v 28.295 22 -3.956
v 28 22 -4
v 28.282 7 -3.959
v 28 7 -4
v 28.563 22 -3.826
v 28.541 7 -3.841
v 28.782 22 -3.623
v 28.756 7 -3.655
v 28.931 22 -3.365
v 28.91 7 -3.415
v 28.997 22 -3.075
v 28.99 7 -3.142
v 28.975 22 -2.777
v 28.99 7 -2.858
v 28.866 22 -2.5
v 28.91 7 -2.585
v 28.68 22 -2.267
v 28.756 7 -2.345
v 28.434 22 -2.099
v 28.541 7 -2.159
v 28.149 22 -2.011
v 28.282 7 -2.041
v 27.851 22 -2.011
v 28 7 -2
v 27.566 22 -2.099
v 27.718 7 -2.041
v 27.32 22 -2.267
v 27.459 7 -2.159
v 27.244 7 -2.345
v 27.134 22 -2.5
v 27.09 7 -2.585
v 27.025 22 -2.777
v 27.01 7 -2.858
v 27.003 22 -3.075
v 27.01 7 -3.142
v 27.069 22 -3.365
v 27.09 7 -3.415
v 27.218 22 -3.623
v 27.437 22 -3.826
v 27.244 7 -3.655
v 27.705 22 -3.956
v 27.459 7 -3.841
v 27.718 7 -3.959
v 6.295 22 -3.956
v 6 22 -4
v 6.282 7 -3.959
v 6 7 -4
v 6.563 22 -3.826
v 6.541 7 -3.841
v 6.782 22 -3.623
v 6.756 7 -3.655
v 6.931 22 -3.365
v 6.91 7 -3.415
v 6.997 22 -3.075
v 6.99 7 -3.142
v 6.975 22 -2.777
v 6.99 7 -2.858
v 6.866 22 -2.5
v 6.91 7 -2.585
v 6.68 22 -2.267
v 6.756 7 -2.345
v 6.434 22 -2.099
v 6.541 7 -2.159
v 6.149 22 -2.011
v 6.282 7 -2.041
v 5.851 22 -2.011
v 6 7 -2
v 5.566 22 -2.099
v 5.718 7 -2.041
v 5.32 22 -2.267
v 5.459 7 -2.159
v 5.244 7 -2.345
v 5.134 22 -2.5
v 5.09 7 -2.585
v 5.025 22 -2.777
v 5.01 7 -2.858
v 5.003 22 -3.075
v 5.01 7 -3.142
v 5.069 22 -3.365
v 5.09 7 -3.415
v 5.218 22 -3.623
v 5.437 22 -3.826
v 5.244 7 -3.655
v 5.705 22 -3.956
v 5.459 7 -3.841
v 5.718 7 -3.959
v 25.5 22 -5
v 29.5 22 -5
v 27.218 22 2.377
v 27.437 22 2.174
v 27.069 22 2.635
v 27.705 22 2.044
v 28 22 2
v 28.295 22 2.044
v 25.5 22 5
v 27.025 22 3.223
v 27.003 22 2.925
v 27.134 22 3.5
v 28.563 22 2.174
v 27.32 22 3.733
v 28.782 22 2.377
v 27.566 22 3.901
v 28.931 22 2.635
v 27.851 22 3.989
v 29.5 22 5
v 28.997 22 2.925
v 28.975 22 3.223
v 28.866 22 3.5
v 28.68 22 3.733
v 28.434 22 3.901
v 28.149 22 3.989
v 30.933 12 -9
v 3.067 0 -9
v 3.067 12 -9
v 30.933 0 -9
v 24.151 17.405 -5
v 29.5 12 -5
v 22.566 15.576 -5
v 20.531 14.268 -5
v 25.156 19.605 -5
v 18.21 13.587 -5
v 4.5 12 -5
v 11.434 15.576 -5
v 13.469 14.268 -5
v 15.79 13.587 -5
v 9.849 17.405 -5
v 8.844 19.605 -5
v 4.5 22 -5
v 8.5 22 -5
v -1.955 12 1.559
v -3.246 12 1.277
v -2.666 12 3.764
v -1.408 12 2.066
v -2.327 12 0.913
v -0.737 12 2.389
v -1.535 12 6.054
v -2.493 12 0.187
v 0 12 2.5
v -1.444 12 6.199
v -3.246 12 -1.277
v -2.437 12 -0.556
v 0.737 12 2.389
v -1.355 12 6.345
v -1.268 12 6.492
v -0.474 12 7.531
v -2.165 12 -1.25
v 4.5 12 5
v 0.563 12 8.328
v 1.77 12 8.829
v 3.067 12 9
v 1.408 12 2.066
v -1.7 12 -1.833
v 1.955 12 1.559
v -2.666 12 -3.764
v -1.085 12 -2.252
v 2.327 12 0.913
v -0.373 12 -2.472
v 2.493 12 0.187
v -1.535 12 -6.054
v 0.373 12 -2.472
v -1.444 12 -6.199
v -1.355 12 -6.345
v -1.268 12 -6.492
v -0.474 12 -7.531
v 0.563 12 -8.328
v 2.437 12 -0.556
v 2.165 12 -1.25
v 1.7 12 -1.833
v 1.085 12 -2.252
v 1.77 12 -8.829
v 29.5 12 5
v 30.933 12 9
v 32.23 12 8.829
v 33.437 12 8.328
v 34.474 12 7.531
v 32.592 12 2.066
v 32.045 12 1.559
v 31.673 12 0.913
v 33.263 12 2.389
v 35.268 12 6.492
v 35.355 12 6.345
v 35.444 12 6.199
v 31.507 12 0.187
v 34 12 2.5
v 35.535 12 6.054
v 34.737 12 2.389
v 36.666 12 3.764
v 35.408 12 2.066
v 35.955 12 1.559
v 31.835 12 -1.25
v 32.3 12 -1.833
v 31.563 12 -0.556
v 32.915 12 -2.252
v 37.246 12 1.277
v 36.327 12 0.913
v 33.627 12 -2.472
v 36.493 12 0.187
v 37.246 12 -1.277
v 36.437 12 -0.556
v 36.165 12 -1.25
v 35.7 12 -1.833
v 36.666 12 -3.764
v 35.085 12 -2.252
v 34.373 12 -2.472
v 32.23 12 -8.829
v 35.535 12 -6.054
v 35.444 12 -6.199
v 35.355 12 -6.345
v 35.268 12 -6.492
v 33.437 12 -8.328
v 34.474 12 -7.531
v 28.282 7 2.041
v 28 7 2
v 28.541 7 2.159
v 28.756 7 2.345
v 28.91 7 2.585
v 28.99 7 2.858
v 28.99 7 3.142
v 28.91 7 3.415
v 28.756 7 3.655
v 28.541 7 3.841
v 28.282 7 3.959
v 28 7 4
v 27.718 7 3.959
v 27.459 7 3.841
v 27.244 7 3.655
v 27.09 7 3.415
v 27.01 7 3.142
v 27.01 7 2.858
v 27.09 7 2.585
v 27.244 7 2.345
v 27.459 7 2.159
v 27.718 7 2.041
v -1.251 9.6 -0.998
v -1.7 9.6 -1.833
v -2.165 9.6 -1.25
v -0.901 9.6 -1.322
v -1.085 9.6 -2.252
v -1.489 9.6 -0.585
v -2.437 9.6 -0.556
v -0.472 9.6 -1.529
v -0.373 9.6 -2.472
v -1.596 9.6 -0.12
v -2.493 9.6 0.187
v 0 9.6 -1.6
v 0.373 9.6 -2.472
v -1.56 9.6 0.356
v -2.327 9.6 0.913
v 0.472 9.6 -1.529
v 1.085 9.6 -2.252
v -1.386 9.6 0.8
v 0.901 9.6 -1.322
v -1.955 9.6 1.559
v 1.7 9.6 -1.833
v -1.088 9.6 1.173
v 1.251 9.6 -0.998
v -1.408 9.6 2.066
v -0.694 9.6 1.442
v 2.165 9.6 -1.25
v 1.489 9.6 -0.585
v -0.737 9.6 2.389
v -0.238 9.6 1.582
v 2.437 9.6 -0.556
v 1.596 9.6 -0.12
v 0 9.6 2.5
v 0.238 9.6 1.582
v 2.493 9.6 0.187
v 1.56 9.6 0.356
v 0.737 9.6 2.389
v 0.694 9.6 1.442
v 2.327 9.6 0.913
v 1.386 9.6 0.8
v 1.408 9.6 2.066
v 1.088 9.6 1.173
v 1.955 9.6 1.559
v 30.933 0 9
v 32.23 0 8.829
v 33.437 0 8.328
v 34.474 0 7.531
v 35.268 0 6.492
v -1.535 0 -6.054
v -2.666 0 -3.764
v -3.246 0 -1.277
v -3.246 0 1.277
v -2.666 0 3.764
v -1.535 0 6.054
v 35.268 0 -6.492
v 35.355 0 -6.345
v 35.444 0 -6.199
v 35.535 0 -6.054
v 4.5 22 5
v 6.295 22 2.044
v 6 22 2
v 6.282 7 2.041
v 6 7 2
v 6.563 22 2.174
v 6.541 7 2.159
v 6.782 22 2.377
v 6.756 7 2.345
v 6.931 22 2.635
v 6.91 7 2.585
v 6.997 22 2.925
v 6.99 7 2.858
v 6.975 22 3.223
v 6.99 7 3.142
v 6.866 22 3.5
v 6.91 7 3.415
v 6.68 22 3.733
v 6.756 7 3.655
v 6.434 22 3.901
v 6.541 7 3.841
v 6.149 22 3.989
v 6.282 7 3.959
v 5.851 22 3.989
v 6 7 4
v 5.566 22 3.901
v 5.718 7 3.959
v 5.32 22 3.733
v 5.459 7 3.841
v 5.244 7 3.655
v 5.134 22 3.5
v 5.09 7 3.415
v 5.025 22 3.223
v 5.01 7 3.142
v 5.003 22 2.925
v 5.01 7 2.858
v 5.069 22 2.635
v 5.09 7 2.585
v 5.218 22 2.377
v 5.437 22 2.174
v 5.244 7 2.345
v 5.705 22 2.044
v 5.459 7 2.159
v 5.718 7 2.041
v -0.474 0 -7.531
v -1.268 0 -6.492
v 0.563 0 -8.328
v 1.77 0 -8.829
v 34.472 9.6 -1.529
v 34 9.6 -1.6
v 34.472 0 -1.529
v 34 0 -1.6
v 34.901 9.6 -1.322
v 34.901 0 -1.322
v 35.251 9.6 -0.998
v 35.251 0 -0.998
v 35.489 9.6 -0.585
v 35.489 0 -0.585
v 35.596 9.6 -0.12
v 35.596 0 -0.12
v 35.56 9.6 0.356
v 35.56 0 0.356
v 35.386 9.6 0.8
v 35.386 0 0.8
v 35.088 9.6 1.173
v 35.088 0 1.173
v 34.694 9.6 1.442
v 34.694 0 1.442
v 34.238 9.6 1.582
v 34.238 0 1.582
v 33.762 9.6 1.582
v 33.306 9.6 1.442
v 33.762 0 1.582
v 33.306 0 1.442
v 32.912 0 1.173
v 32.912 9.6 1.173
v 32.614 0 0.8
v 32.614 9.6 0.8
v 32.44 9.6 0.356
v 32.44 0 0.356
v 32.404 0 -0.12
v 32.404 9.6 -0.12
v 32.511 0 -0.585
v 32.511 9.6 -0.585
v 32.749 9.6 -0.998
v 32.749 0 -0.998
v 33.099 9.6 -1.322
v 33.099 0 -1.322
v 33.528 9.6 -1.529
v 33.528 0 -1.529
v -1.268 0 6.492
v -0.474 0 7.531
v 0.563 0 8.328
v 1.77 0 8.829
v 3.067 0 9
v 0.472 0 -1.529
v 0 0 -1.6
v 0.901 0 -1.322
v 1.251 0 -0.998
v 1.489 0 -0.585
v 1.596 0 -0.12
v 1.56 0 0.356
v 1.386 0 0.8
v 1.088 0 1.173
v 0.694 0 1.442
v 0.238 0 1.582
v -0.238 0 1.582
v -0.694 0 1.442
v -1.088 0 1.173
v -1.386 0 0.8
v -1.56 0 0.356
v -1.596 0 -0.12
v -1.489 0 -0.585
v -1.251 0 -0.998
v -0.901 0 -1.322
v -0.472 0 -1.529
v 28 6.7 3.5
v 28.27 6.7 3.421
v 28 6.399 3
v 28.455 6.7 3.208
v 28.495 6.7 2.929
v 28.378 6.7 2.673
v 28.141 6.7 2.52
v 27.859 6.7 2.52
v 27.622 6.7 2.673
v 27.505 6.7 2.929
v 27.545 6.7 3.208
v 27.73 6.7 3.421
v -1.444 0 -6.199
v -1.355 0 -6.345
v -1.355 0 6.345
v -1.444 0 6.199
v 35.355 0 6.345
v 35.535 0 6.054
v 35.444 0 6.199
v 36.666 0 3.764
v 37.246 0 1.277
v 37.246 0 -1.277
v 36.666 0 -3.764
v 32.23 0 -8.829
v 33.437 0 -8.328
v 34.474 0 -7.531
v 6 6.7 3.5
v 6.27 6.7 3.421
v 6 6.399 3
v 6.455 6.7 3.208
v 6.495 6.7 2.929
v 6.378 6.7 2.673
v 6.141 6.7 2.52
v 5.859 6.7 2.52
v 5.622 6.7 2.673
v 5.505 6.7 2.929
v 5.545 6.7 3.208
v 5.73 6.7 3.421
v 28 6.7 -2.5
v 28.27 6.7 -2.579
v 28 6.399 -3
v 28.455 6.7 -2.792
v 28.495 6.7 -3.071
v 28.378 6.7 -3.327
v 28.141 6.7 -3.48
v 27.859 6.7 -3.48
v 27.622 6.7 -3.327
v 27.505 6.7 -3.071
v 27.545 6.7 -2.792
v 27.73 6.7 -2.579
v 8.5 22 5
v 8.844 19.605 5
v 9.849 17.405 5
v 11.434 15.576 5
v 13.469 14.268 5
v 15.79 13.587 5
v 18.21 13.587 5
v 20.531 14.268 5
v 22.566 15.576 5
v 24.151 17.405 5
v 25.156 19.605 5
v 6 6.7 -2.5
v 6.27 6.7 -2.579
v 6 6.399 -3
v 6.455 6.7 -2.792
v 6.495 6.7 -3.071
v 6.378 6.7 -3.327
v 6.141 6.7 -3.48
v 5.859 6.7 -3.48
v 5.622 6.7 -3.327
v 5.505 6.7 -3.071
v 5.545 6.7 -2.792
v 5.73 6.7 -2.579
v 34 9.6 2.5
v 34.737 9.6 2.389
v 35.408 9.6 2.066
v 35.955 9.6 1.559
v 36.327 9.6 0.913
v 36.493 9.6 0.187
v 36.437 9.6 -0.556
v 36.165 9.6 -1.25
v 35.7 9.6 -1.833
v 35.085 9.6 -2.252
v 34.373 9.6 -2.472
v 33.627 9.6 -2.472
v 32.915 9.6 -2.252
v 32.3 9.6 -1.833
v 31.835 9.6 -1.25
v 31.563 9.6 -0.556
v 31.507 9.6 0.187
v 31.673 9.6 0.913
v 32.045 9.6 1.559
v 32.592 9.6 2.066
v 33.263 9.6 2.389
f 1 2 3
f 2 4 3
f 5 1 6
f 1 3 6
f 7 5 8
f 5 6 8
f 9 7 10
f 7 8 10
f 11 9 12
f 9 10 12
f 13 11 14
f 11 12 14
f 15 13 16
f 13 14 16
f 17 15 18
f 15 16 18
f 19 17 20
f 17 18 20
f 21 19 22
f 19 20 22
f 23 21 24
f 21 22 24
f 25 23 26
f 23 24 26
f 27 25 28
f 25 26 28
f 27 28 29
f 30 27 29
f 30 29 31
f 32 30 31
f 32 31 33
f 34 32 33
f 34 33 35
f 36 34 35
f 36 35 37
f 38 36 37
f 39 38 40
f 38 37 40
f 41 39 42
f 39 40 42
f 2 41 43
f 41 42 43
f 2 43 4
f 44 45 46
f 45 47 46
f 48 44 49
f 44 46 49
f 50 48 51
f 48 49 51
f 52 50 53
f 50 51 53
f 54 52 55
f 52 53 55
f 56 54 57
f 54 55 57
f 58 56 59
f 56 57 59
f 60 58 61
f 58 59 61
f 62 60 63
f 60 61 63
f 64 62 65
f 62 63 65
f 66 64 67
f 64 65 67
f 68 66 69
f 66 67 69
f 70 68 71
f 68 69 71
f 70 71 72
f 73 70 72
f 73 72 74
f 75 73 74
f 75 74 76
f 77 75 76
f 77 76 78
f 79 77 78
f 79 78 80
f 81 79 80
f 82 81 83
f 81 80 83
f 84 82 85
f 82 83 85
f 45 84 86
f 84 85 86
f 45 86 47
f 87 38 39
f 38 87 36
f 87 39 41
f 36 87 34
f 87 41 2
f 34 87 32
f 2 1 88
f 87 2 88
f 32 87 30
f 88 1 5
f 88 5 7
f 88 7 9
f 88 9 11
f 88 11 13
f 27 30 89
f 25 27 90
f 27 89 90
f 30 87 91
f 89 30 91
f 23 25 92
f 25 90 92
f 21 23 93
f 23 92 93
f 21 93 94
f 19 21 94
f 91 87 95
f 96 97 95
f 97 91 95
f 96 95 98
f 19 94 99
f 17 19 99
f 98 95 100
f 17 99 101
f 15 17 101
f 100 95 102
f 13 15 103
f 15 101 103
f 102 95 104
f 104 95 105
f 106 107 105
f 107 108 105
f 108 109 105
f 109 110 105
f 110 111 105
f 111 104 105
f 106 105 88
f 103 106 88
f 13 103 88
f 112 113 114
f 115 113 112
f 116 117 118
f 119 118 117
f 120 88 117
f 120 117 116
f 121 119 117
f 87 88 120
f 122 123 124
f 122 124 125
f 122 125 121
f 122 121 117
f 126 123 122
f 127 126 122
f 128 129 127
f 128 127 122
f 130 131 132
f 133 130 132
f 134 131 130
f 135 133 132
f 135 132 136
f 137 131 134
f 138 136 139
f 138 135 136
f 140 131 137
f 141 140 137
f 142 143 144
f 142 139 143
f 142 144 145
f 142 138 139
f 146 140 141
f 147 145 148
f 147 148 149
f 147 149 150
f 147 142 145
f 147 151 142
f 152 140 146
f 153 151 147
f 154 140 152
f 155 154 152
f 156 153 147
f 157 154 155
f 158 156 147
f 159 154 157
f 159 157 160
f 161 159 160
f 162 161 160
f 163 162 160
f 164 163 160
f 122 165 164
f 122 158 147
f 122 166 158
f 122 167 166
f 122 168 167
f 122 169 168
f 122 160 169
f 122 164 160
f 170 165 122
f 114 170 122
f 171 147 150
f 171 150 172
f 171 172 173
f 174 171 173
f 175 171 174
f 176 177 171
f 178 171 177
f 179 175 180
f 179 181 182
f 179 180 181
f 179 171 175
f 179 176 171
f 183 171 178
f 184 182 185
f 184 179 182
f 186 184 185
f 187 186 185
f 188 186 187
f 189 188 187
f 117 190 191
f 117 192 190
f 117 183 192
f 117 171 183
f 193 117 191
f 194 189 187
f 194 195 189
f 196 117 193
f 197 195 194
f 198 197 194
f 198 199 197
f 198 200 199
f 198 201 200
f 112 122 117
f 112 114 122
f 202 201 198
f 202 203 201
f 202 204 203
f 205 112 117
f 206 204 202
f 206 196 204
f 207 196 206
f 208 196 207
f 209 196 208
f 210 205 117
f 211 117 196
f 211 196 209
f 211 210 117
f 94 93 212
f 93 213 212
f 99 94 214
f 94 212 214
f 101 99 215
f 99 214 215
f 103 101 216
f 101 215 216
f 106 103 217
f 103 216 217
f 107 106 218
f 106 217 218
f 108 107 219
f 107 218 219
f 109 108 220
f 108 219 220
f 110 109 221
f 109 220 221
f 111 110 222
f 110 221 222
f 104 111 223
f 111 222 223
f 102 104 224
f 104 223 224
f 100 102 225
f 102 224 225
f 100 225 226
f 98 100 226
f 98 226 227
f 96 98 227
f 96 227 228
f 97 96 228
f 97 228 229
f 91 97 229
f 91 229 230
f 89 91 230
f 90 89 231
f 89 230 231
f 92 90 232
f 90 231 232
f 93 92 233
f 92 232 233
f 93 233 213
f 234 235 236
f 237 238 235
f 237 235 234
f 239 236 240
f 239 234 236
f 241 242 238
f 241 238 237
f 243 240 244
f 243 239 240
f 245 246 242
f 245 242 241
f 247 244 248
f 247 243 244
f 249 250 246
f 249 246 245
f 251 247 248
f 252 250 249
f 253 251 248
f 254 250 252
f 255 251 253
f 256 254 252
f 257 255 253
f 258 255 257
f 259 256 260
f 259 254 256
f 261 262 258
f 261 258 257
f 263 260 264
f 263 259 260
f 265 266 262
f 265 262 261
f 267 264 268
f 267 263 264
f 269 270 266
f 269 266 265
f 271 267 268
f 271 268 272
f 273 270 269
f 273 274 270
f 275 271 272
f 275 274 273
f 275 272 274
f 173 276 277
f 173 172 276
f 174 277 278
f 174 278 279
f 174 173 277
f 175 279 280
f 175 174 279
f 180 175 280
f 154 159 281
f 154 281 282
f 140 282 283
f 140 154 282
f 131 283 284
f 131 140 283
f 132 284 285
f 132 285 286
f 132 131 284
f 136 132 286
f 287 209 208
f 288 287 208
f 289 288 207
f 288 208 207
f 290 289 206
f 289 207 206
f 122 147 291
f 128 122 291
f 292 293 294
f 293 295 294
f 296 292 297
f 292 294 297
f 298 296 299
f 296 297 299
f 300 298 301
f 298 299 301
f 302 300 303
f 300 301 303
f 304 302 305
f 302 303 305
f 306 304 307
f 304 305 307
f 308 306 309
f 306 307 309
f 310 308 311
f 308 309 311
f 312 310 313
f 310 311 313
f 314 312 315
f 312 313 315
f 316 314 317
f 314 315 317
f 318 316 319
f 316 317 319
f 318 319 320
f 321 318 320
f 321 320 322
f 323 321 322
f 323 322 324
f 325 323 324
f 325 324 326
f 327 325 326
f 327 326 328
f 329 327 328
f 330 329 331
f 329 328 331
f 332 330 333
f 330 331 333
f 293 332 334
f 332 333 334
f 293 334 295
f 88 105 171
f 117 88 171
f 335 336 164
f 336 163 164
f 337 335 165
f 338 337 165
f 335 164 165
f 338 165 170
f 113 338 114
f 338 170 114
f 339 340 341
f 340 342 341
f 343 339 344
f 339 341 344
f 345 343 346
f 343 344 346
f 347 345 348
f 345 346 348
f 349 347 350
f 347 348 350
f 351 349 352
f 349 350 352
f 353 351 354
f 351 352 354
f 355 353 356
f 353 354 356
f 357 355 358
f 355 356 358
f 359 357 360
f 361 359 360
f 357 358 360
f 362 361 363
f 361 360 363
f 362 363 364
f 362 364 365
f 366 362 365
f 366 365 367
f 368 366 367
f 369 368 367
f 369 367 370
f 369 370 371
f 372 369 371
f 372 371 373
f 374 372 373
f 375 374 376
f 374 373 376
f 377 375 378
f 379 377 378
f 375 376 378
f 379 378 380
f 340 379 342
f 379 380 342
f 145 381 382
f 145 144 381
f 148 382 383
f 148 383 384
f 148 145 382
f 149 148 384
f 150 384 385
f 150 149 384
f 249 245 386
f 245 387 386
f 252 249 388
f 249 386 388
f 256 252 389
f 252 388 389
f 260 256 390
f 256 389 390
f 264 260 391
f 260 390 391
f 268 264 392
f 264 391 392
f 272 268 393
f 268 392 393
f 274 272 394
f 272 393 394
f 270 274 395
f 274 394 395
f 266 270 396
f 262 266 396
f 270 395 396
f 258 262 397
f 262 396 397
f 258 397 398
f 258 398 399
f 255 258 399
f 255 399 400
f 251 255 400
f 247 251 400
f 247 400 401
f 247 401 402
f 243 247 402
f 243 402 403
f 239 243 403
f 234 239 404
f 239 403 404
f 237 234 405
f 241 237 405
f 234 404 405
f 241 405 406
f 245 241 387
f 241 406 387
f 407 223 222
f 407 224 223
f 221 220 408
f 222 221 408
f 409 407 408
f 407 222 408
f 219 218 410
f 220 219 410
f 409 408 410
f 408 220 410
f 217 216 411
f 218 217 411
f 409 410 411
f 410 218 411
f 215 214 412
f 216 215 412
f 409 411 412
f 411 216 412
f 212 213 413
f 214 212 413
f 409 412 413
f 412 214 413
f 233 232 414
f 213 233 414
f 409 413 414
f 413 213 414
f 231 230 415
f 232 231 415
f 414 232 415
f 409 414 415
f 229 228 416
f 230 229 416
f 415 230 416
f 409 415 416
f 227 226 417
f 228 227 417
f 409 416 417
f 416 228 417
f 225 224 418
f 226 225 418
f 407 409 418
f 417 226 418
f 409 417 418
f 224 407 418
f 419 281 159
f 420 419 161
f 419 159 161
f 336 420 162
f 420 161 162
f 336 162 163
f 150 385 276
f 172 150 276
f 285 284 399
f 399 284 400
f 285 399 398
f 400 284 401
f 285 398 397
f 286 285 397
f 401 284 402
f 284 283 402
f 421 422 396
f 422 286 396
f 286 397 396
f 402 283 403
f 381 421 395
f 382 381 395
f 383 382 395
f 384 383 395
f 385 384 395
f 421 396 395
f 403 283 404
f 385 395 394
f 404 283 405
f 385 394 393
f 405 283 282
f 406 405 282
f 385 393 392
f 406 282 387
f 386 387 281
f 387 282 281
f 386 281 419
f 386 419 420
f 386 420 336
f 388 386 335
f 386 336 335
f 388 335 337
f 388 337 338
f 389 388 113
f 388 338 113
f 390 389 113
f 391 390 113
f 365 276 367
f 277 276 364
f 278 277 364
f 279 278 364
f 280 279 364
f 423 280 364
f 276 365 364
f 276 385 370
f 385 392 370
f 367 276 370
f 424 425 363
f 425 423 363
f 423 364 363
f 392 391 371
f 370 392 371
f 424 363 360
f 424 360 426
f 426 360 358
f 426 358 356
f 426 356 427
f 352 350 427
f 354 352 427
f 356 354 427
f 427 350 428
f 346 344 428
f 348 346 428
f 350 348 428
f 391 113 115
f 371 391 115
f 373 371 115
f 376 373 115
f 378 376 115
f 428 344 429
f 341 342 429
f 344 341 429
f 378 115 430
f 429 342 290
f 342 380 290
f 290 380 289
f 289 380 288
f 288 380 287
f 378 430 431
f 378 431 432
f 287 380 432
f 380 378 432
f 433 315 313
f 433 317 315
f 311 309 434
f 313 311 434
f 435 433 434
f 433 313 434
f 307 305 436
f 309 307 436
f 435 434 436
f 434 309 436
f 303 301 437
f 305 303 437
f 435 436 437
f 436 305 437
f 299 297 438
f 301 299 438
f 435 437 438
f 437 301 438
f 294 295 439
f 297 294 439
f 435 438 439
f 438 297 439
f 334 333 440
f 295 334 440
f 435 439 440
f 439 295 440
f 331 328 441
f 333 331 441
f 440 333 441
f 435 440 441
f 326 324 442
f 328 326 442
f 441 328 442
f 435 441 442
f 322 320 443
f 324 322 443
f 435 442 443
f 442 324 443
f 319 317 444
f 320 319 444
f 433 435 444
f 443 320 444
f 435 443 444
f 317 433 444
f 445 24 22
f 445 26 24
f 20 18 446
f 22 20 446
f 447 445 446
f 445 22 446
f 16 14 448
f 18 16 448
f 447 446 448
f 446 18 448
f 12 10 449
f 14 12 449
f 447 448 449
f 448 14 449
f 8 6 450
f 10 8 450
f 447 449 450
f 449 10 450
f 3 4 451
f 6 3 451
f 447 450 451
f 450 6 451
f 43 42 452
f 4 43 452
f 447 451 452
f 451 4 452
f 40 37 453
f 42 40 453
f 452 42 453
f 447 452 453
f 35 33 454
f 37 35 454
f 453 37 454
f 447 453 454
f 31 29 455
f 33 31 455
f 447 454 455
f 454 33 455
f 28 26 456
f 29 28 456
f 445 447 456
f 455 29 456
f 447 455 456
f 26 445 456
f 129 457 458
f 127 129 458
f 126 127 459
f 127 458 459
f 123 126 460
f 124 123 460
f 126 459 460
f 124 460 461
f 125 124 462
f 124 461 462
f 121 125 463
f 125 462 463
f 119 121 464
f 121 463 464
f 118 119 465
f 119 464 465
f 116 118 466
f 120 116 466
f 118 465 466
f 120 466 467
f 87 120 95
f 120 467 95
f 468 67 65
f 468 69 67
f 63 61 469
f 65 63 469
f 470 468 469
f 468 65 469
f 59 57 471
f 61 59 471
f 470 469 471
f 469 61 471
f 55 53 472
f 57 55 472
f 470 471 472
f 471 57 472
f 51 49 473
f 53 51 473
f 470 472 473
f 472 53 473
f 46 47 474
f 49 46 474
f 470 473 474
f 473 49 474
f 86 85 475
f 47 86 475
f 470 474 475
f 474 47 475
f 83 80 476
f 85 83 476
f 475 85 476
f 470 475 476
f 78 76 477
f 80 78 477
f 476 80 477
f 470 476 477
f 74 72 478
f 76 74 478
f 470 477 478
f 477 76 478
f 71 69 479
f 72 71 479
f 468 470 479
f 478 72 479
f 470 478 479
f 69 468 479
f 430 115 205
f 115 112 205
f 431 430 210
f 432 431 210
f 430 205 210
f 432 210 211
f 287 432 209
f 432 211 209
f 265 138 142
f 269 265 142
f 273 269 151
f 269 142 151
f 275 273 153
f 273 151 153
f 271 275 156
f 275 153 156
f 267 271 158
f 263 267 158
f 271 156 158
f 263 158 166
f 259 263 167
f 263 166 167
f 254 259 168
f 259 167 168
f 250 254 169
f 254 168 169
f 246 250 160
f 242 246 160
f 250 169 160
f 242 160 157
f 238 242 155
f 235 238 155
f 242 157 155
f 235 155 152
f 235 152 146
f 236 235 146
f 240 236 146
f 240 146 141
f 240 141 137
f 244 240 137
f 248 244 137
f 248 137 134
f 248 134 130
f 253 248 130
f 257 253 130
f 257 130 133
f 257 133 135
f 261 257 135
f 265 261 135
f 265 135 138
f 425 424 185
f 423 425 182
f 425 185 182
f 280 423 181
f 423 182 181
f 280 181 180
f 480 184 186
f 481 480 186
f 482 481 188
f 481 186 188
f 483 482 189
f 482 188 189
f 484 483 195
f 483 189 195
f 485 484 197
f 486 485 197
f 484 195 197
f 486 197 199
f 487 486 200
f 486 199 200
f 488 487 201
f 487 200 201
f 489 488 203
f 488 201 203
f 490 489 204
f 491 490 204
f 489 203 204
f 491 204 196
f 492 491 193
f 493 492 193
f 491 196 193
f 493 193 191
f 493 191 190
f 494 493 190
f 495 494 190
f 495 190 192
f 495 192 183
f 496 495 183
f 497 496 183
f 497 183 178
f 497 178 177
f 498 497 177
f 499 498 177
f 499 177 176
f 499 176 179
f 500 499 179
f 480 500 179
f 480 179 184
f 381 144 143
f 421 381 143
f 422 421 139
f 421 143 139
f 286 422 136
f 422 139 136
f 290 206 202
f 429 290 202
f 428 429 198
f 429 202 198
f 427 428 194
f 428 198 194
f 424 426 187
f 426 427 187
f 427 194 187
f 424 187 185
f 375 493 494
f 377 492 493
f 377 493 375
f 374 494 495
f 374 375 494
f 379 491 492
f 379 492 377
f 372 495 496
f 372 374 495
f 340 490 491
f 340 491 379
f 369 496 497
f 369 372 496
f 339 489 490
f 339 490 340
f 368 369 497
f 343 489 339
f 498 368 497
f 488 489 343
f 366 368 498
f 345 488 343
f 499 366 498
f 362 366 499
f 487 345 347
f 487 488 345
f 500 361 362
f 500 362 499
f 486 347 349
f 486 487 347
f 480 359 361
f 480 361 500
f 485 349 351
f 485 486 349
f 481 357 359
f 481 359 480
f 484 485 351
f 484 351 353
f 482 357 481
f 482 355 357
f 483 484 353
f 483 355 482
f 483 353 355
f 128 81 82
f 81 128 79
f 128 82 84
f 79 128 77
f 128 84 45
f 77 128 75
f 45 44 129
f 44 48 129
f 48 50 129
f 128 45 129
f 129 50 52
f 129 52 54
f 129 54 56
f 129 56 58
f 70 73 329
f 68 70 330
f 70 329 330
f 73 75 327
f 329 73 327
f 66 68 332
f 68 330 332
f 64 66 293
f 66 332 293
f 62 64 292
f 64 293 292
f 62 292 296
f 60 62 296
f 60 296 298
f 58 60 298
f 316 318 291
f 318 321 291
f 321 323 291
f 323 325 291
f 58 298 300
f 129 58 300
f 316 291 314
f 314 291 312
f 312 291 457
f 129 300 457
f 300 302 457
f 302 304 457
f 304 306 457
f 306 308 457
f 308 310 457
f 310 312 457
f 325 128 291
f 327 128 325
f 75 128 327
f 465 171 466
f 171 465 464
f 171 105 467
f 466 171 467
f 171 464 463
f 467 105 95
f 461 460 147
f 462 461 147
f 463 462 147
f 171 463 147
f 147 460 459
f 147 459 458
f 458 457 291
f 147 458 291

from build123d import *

# Parameters (mm, degrees)
CROQUIS2_W                                           = 47.2
CROQUIS2_H                                           = 18
SALIENTE_EXTRUIR1_DEPTH                              = 12
SALIENTE_EXTRUIR2_DEPTH                              = 5
SALIENTE_EXTRUIR2_DEPTH_BACK                         = 5
REFRENTADO_PARA_TORNILLO_CON_CABEZA_TRON_D           = 3.2
REFRENTADO_PARA_TORNILLO_CON_CABEZA_TRON_DEPTH       = 30
REFRENTADO_PARA_TORNILLO_CON_CABEZA_TRON_CBORE_D     = 5
REFRENTADO_PARA_TORNILLO_CON_CABEZA_TRON_CBORE_DEPTH = 2.4
REFRENTADO_PARA_TORNILLO_CON_CABEZA_TRON_TIP         = 0.96137699
TALADRO_DE_MARGEN_PARA_M21_D                         = 2
TALADRO_DE_MARGEN_PARA_M21_DEPTH                     = 15
TALADRO_DE_MARGEN_PARA_M21_TIP                       = 0.600860619
CROQUIS14_R                                          = 10
CORTAR_EXTRUIR1_DEPTH                                = 16
REDONDEO1_R                                          = 6
CORTAR_EXTRUIR2_DEPTH                                = 16
REDONDEO2_R                                          = 5
REDONDEO3_R                                          = 5


with BuildPart() as part:
    # Croquis2 → Saliente-Extruir1 (new body)
    with BuildSketch(Plane(origin=(0, 0, 0), x_dir=(1, 0, 0), z_dir=(0, 1, 0))):
        with Locations((17, 0)):
            Rectangle(CROQUIS2_W, CROQUIS2_H)
    extrude(amount=SALIENTE_EXTRUIR1_DEPTH)

    # Croquis4 → Saliente-Extruir2 (add, two sides: drawn at the far end of the back side and taken through both)
    with BuildSketch(Plane(origin=(0, 0, 0), x_dir=(-1, 0, 0), z_dir=(0, 0, -1)).offset(-SALIENTE_EXTRUIR2_DEPTH_BACK)):
        with BuildLine():
            Line((-25.5, 22), (-29.5, 22))
            Line((-29.5, 22), (-29.5, 12))
            Line((-29.5, 12), (-4.5, 12))
            Line((-4.5, 12), (-4.5, 22))
            Line((-4.5, 22), (-8.5, 22))
            ThreePointArc((-8.5, 22), (-17, 13.5), (-25.5, 22))
        make_face()
    extrude(amount=SALIENTE_EXTRUIR2_DEPTH + SALIENTE_EXTRUIR2_DEPTH_BACK)

    # Refrentado para tornillo con cabeza troncocónica de M31
    with Locations(Plane.ZX.offset(12)):
        with Locations((0, 0), (0, 34)):
            CounterBoreHole(REFRENTADO_PARA_TORNILLO_CON_CABEZA_TRON_D / 2, REFRENTADO_PARA_TORNILLO_CON_CABEZA_TRON_CBORE_D / 2, REFRENTADO_PARA_TORNILLO_CON_CABEZA_TRON_CBORE_DEPTH, depth=REFRENTADO_PARA_TORNILLO_CON_CABEZA_TRON_DEPTH)
            with Locations((0, 0, -(REFRENTADO_PARA_TORNILLO_CON_CABEZA_TRON_DEPTH + REFRENTADO_PARA_TORNILLO_CON_CABEZA_TRON_TIP / 2))):  # 118° drill point
                Cone(0, REFRENTADO_PARA_TORNILLO_CON_CABEZA_TRON_D / 2, REFRENTADO_PARA_TORNILLO_CON_CABEZA_TRON_TIP, mode=Mode.SUBTRACT)

    # Taladro de margen para M21
    with Locations(Plane(origin=(6, 22, -3), x_dir=(0, 0, 1), z_dir=(0, 1, 0))):
        with Locations((0, 0), (6, 0), (0, 22), (6, 22)):
            Hole(TALADRO_DE_MARGEN_PARA_M21_D / 2, depth=TALADRO_DE_MARGEN_PARA_M21_DEPTH)
            with Locations((0, 0, -(TALADRO_DE_MARGEN_PARA_M21_DEPTH + TALADRO_DE_MARGEN_PARA_M21_TIP / 2))):  # 118° drill point
                Cone(0, TALADRO_DE_MARGEN_PARA_M21_D / 2, TALADRO_DE_MARGEN_PARA_M21_TIP, mode=Mode.SUBTRACT)

    # Croquis14 → Cortar-Extruir1 (cut)
    with BuildSketch(Plane(origin=(0, 12, 0), x_dir=(1, 0, 0), z_dir=(0, 1, 0))):
        with Locations((43.936945617, 11.477309168)):
            Circle(CROQUIS14_R)
        with Locations((-9.936945617, 11.477309168)):
            Circle(CROQUIS14_R)
        with Locations((43.936945617, -11.477309168)):
            Circle(CROQUIS14_R)
        with Locations((-9.936945617, -11.477309168)):
            Circle(CROQUIS14_R)
    extrude(amount=-CORTAR_EXTRUIR1_DEPTH, mode=Mode.SUBTRACT)

    # Redondeo1
    # the kernel refuses this fillet: 6 mm, written as the material it takes off along each edge
    with BuildSketch(Plane(origin=(-6.6, -8.915795606, -2.050496666), x_dir=(0, 0, 1), z_dir=(0, 1, 0))) as redondeo1_piece_1:
        with BuildLine():
            CenterArc((3.566318242, 6), REDONDEO1_R, 215.701262203, 54.298737797)
            ThreePointArc((-1.306105787, 2.498645393), (-0.564551793, 1.295584483), (0, 0))
            Line((0, 0), (3.566318242, 0))
        make_face()
    extrude(amount=29.831591212, mode=Mode.SUBTRACT)
    with BuildSketch(Plane(origin=(-6.6, -8.915795606, 2.050496666), x_dir=(0, 0, -1), z_dir=(0, 1, 0)), Plane(origin=(40.6, -8.915795606, -2.050496666), x_dir=(0, 0, 1), z_dir=(0, 1, 0))) as redondeo1_piece_2:
        with BuildLine():
            CenterArc((3.566318242, -6), REDONDEO1_R, 90, 54.298737797)
            ThreePointArc((-1.306105787, -2.498645393), (-0.564551793, -1.295584483), (0, 0))
            Line((0, 0), (3.566318242, 0))
        make_face()
    extrude(amount=29.831591212, mode=Mode.SUBTRACT)
    with BuildSketch(Plane(origin=(40.6, -8.915795606, 2.050496666), x_dir=(-0.886226070867775, 0, 0.46325301004339436), z_dir=(0, 1, 0))) as redondeo1_piece_3:
        with BuildLine():
            CenterArc((3.665248765, -5.940082264), REDONDEO1_R, 98.104043871, 54.298737797)
            Line((-1.652107661, -3.160564203), (0, 0))
            ThreePointArc((0, 0), (1.409711063, -0.099862894), (2.819422127, 0))
        make_face()
    extrude(amount=29.831591212, mode=Mode.SUBTRACT)

    # Croquis15 → Cortar-Extruir2 (cut)
    with BuildSketch(Plane(origin=(0, 12, 0), x_dir=(1, 0, 0), z_dir=(0, 1, 0))):
        with BuildLine():
            ThreePointArc((-1.535379674, 6.05387025), (-3.319618886, 0), (-1.535379674, -6.05387025))
            ThreePointArc((-1.535379674, -6.05387025), (-2.691742174, -4.584775013), (-4.101354607, -3.356602453))
            ThreePointArc((-4.101354607, -3.356602453), (-5.546762714, -1.879695859), (-6.405366909, 0))
            ThreePointArc((-6.405366909, 0), (-5.546762714, 1.879695859), (-4.101354607, 3.356602453))
            ThreePointArc((-4.101354607, 3.356602453), (-2.691742174, 4.584775013), (-1.535379674, 6.05387025))
        make_face()
        with BuildLine():
            ThreePointArc((38.101354607, 3.356602453), (36.691742174, 4.584775013), (35.535379674, 6.05387025))
            ThreePointArc((35.535379674, 6.05387025), (37.319618886, 0), (35.535379674, -6.05387025))
            ThreePointArc((35.535379674, -6.05387025), (36.691742174, -4.584775013), (38.101354607, -3.356602453))
            ThreePointArc((38.101354607, -3.356602453), (39.546762714, -1.879695859), (40.405366909, 0))
            ThreePointArc((40.405366909, 0), (39.546762714, 1.879695859), (38.101354607, 3.356602453))
        make_face()
    extrude(amount=-CORTAR_EXTRUIR2_DEPTH, mode=Mode.SUBTRACT)

    # Redondeo2
    redondeo2_edges = [part.edges().sort_by_distance(p)[0] for p in [
        (34.248656848, 6, -9),
        (-0.248656848, 6, -9),
    ]]
    fillet(redondeo2_edges, radius=REDONDEO2_R)

    # Redondeo3
    redondeo3_edges = [part.edges().sort_by_distance(p)[0] for p in [
        (34.248656848, 6, 9),
        (-0.248656848, 6, 9),
    ]]
    fillet(redondeo3_edges, radius=REDONDEO3_R)


solid = part.part
